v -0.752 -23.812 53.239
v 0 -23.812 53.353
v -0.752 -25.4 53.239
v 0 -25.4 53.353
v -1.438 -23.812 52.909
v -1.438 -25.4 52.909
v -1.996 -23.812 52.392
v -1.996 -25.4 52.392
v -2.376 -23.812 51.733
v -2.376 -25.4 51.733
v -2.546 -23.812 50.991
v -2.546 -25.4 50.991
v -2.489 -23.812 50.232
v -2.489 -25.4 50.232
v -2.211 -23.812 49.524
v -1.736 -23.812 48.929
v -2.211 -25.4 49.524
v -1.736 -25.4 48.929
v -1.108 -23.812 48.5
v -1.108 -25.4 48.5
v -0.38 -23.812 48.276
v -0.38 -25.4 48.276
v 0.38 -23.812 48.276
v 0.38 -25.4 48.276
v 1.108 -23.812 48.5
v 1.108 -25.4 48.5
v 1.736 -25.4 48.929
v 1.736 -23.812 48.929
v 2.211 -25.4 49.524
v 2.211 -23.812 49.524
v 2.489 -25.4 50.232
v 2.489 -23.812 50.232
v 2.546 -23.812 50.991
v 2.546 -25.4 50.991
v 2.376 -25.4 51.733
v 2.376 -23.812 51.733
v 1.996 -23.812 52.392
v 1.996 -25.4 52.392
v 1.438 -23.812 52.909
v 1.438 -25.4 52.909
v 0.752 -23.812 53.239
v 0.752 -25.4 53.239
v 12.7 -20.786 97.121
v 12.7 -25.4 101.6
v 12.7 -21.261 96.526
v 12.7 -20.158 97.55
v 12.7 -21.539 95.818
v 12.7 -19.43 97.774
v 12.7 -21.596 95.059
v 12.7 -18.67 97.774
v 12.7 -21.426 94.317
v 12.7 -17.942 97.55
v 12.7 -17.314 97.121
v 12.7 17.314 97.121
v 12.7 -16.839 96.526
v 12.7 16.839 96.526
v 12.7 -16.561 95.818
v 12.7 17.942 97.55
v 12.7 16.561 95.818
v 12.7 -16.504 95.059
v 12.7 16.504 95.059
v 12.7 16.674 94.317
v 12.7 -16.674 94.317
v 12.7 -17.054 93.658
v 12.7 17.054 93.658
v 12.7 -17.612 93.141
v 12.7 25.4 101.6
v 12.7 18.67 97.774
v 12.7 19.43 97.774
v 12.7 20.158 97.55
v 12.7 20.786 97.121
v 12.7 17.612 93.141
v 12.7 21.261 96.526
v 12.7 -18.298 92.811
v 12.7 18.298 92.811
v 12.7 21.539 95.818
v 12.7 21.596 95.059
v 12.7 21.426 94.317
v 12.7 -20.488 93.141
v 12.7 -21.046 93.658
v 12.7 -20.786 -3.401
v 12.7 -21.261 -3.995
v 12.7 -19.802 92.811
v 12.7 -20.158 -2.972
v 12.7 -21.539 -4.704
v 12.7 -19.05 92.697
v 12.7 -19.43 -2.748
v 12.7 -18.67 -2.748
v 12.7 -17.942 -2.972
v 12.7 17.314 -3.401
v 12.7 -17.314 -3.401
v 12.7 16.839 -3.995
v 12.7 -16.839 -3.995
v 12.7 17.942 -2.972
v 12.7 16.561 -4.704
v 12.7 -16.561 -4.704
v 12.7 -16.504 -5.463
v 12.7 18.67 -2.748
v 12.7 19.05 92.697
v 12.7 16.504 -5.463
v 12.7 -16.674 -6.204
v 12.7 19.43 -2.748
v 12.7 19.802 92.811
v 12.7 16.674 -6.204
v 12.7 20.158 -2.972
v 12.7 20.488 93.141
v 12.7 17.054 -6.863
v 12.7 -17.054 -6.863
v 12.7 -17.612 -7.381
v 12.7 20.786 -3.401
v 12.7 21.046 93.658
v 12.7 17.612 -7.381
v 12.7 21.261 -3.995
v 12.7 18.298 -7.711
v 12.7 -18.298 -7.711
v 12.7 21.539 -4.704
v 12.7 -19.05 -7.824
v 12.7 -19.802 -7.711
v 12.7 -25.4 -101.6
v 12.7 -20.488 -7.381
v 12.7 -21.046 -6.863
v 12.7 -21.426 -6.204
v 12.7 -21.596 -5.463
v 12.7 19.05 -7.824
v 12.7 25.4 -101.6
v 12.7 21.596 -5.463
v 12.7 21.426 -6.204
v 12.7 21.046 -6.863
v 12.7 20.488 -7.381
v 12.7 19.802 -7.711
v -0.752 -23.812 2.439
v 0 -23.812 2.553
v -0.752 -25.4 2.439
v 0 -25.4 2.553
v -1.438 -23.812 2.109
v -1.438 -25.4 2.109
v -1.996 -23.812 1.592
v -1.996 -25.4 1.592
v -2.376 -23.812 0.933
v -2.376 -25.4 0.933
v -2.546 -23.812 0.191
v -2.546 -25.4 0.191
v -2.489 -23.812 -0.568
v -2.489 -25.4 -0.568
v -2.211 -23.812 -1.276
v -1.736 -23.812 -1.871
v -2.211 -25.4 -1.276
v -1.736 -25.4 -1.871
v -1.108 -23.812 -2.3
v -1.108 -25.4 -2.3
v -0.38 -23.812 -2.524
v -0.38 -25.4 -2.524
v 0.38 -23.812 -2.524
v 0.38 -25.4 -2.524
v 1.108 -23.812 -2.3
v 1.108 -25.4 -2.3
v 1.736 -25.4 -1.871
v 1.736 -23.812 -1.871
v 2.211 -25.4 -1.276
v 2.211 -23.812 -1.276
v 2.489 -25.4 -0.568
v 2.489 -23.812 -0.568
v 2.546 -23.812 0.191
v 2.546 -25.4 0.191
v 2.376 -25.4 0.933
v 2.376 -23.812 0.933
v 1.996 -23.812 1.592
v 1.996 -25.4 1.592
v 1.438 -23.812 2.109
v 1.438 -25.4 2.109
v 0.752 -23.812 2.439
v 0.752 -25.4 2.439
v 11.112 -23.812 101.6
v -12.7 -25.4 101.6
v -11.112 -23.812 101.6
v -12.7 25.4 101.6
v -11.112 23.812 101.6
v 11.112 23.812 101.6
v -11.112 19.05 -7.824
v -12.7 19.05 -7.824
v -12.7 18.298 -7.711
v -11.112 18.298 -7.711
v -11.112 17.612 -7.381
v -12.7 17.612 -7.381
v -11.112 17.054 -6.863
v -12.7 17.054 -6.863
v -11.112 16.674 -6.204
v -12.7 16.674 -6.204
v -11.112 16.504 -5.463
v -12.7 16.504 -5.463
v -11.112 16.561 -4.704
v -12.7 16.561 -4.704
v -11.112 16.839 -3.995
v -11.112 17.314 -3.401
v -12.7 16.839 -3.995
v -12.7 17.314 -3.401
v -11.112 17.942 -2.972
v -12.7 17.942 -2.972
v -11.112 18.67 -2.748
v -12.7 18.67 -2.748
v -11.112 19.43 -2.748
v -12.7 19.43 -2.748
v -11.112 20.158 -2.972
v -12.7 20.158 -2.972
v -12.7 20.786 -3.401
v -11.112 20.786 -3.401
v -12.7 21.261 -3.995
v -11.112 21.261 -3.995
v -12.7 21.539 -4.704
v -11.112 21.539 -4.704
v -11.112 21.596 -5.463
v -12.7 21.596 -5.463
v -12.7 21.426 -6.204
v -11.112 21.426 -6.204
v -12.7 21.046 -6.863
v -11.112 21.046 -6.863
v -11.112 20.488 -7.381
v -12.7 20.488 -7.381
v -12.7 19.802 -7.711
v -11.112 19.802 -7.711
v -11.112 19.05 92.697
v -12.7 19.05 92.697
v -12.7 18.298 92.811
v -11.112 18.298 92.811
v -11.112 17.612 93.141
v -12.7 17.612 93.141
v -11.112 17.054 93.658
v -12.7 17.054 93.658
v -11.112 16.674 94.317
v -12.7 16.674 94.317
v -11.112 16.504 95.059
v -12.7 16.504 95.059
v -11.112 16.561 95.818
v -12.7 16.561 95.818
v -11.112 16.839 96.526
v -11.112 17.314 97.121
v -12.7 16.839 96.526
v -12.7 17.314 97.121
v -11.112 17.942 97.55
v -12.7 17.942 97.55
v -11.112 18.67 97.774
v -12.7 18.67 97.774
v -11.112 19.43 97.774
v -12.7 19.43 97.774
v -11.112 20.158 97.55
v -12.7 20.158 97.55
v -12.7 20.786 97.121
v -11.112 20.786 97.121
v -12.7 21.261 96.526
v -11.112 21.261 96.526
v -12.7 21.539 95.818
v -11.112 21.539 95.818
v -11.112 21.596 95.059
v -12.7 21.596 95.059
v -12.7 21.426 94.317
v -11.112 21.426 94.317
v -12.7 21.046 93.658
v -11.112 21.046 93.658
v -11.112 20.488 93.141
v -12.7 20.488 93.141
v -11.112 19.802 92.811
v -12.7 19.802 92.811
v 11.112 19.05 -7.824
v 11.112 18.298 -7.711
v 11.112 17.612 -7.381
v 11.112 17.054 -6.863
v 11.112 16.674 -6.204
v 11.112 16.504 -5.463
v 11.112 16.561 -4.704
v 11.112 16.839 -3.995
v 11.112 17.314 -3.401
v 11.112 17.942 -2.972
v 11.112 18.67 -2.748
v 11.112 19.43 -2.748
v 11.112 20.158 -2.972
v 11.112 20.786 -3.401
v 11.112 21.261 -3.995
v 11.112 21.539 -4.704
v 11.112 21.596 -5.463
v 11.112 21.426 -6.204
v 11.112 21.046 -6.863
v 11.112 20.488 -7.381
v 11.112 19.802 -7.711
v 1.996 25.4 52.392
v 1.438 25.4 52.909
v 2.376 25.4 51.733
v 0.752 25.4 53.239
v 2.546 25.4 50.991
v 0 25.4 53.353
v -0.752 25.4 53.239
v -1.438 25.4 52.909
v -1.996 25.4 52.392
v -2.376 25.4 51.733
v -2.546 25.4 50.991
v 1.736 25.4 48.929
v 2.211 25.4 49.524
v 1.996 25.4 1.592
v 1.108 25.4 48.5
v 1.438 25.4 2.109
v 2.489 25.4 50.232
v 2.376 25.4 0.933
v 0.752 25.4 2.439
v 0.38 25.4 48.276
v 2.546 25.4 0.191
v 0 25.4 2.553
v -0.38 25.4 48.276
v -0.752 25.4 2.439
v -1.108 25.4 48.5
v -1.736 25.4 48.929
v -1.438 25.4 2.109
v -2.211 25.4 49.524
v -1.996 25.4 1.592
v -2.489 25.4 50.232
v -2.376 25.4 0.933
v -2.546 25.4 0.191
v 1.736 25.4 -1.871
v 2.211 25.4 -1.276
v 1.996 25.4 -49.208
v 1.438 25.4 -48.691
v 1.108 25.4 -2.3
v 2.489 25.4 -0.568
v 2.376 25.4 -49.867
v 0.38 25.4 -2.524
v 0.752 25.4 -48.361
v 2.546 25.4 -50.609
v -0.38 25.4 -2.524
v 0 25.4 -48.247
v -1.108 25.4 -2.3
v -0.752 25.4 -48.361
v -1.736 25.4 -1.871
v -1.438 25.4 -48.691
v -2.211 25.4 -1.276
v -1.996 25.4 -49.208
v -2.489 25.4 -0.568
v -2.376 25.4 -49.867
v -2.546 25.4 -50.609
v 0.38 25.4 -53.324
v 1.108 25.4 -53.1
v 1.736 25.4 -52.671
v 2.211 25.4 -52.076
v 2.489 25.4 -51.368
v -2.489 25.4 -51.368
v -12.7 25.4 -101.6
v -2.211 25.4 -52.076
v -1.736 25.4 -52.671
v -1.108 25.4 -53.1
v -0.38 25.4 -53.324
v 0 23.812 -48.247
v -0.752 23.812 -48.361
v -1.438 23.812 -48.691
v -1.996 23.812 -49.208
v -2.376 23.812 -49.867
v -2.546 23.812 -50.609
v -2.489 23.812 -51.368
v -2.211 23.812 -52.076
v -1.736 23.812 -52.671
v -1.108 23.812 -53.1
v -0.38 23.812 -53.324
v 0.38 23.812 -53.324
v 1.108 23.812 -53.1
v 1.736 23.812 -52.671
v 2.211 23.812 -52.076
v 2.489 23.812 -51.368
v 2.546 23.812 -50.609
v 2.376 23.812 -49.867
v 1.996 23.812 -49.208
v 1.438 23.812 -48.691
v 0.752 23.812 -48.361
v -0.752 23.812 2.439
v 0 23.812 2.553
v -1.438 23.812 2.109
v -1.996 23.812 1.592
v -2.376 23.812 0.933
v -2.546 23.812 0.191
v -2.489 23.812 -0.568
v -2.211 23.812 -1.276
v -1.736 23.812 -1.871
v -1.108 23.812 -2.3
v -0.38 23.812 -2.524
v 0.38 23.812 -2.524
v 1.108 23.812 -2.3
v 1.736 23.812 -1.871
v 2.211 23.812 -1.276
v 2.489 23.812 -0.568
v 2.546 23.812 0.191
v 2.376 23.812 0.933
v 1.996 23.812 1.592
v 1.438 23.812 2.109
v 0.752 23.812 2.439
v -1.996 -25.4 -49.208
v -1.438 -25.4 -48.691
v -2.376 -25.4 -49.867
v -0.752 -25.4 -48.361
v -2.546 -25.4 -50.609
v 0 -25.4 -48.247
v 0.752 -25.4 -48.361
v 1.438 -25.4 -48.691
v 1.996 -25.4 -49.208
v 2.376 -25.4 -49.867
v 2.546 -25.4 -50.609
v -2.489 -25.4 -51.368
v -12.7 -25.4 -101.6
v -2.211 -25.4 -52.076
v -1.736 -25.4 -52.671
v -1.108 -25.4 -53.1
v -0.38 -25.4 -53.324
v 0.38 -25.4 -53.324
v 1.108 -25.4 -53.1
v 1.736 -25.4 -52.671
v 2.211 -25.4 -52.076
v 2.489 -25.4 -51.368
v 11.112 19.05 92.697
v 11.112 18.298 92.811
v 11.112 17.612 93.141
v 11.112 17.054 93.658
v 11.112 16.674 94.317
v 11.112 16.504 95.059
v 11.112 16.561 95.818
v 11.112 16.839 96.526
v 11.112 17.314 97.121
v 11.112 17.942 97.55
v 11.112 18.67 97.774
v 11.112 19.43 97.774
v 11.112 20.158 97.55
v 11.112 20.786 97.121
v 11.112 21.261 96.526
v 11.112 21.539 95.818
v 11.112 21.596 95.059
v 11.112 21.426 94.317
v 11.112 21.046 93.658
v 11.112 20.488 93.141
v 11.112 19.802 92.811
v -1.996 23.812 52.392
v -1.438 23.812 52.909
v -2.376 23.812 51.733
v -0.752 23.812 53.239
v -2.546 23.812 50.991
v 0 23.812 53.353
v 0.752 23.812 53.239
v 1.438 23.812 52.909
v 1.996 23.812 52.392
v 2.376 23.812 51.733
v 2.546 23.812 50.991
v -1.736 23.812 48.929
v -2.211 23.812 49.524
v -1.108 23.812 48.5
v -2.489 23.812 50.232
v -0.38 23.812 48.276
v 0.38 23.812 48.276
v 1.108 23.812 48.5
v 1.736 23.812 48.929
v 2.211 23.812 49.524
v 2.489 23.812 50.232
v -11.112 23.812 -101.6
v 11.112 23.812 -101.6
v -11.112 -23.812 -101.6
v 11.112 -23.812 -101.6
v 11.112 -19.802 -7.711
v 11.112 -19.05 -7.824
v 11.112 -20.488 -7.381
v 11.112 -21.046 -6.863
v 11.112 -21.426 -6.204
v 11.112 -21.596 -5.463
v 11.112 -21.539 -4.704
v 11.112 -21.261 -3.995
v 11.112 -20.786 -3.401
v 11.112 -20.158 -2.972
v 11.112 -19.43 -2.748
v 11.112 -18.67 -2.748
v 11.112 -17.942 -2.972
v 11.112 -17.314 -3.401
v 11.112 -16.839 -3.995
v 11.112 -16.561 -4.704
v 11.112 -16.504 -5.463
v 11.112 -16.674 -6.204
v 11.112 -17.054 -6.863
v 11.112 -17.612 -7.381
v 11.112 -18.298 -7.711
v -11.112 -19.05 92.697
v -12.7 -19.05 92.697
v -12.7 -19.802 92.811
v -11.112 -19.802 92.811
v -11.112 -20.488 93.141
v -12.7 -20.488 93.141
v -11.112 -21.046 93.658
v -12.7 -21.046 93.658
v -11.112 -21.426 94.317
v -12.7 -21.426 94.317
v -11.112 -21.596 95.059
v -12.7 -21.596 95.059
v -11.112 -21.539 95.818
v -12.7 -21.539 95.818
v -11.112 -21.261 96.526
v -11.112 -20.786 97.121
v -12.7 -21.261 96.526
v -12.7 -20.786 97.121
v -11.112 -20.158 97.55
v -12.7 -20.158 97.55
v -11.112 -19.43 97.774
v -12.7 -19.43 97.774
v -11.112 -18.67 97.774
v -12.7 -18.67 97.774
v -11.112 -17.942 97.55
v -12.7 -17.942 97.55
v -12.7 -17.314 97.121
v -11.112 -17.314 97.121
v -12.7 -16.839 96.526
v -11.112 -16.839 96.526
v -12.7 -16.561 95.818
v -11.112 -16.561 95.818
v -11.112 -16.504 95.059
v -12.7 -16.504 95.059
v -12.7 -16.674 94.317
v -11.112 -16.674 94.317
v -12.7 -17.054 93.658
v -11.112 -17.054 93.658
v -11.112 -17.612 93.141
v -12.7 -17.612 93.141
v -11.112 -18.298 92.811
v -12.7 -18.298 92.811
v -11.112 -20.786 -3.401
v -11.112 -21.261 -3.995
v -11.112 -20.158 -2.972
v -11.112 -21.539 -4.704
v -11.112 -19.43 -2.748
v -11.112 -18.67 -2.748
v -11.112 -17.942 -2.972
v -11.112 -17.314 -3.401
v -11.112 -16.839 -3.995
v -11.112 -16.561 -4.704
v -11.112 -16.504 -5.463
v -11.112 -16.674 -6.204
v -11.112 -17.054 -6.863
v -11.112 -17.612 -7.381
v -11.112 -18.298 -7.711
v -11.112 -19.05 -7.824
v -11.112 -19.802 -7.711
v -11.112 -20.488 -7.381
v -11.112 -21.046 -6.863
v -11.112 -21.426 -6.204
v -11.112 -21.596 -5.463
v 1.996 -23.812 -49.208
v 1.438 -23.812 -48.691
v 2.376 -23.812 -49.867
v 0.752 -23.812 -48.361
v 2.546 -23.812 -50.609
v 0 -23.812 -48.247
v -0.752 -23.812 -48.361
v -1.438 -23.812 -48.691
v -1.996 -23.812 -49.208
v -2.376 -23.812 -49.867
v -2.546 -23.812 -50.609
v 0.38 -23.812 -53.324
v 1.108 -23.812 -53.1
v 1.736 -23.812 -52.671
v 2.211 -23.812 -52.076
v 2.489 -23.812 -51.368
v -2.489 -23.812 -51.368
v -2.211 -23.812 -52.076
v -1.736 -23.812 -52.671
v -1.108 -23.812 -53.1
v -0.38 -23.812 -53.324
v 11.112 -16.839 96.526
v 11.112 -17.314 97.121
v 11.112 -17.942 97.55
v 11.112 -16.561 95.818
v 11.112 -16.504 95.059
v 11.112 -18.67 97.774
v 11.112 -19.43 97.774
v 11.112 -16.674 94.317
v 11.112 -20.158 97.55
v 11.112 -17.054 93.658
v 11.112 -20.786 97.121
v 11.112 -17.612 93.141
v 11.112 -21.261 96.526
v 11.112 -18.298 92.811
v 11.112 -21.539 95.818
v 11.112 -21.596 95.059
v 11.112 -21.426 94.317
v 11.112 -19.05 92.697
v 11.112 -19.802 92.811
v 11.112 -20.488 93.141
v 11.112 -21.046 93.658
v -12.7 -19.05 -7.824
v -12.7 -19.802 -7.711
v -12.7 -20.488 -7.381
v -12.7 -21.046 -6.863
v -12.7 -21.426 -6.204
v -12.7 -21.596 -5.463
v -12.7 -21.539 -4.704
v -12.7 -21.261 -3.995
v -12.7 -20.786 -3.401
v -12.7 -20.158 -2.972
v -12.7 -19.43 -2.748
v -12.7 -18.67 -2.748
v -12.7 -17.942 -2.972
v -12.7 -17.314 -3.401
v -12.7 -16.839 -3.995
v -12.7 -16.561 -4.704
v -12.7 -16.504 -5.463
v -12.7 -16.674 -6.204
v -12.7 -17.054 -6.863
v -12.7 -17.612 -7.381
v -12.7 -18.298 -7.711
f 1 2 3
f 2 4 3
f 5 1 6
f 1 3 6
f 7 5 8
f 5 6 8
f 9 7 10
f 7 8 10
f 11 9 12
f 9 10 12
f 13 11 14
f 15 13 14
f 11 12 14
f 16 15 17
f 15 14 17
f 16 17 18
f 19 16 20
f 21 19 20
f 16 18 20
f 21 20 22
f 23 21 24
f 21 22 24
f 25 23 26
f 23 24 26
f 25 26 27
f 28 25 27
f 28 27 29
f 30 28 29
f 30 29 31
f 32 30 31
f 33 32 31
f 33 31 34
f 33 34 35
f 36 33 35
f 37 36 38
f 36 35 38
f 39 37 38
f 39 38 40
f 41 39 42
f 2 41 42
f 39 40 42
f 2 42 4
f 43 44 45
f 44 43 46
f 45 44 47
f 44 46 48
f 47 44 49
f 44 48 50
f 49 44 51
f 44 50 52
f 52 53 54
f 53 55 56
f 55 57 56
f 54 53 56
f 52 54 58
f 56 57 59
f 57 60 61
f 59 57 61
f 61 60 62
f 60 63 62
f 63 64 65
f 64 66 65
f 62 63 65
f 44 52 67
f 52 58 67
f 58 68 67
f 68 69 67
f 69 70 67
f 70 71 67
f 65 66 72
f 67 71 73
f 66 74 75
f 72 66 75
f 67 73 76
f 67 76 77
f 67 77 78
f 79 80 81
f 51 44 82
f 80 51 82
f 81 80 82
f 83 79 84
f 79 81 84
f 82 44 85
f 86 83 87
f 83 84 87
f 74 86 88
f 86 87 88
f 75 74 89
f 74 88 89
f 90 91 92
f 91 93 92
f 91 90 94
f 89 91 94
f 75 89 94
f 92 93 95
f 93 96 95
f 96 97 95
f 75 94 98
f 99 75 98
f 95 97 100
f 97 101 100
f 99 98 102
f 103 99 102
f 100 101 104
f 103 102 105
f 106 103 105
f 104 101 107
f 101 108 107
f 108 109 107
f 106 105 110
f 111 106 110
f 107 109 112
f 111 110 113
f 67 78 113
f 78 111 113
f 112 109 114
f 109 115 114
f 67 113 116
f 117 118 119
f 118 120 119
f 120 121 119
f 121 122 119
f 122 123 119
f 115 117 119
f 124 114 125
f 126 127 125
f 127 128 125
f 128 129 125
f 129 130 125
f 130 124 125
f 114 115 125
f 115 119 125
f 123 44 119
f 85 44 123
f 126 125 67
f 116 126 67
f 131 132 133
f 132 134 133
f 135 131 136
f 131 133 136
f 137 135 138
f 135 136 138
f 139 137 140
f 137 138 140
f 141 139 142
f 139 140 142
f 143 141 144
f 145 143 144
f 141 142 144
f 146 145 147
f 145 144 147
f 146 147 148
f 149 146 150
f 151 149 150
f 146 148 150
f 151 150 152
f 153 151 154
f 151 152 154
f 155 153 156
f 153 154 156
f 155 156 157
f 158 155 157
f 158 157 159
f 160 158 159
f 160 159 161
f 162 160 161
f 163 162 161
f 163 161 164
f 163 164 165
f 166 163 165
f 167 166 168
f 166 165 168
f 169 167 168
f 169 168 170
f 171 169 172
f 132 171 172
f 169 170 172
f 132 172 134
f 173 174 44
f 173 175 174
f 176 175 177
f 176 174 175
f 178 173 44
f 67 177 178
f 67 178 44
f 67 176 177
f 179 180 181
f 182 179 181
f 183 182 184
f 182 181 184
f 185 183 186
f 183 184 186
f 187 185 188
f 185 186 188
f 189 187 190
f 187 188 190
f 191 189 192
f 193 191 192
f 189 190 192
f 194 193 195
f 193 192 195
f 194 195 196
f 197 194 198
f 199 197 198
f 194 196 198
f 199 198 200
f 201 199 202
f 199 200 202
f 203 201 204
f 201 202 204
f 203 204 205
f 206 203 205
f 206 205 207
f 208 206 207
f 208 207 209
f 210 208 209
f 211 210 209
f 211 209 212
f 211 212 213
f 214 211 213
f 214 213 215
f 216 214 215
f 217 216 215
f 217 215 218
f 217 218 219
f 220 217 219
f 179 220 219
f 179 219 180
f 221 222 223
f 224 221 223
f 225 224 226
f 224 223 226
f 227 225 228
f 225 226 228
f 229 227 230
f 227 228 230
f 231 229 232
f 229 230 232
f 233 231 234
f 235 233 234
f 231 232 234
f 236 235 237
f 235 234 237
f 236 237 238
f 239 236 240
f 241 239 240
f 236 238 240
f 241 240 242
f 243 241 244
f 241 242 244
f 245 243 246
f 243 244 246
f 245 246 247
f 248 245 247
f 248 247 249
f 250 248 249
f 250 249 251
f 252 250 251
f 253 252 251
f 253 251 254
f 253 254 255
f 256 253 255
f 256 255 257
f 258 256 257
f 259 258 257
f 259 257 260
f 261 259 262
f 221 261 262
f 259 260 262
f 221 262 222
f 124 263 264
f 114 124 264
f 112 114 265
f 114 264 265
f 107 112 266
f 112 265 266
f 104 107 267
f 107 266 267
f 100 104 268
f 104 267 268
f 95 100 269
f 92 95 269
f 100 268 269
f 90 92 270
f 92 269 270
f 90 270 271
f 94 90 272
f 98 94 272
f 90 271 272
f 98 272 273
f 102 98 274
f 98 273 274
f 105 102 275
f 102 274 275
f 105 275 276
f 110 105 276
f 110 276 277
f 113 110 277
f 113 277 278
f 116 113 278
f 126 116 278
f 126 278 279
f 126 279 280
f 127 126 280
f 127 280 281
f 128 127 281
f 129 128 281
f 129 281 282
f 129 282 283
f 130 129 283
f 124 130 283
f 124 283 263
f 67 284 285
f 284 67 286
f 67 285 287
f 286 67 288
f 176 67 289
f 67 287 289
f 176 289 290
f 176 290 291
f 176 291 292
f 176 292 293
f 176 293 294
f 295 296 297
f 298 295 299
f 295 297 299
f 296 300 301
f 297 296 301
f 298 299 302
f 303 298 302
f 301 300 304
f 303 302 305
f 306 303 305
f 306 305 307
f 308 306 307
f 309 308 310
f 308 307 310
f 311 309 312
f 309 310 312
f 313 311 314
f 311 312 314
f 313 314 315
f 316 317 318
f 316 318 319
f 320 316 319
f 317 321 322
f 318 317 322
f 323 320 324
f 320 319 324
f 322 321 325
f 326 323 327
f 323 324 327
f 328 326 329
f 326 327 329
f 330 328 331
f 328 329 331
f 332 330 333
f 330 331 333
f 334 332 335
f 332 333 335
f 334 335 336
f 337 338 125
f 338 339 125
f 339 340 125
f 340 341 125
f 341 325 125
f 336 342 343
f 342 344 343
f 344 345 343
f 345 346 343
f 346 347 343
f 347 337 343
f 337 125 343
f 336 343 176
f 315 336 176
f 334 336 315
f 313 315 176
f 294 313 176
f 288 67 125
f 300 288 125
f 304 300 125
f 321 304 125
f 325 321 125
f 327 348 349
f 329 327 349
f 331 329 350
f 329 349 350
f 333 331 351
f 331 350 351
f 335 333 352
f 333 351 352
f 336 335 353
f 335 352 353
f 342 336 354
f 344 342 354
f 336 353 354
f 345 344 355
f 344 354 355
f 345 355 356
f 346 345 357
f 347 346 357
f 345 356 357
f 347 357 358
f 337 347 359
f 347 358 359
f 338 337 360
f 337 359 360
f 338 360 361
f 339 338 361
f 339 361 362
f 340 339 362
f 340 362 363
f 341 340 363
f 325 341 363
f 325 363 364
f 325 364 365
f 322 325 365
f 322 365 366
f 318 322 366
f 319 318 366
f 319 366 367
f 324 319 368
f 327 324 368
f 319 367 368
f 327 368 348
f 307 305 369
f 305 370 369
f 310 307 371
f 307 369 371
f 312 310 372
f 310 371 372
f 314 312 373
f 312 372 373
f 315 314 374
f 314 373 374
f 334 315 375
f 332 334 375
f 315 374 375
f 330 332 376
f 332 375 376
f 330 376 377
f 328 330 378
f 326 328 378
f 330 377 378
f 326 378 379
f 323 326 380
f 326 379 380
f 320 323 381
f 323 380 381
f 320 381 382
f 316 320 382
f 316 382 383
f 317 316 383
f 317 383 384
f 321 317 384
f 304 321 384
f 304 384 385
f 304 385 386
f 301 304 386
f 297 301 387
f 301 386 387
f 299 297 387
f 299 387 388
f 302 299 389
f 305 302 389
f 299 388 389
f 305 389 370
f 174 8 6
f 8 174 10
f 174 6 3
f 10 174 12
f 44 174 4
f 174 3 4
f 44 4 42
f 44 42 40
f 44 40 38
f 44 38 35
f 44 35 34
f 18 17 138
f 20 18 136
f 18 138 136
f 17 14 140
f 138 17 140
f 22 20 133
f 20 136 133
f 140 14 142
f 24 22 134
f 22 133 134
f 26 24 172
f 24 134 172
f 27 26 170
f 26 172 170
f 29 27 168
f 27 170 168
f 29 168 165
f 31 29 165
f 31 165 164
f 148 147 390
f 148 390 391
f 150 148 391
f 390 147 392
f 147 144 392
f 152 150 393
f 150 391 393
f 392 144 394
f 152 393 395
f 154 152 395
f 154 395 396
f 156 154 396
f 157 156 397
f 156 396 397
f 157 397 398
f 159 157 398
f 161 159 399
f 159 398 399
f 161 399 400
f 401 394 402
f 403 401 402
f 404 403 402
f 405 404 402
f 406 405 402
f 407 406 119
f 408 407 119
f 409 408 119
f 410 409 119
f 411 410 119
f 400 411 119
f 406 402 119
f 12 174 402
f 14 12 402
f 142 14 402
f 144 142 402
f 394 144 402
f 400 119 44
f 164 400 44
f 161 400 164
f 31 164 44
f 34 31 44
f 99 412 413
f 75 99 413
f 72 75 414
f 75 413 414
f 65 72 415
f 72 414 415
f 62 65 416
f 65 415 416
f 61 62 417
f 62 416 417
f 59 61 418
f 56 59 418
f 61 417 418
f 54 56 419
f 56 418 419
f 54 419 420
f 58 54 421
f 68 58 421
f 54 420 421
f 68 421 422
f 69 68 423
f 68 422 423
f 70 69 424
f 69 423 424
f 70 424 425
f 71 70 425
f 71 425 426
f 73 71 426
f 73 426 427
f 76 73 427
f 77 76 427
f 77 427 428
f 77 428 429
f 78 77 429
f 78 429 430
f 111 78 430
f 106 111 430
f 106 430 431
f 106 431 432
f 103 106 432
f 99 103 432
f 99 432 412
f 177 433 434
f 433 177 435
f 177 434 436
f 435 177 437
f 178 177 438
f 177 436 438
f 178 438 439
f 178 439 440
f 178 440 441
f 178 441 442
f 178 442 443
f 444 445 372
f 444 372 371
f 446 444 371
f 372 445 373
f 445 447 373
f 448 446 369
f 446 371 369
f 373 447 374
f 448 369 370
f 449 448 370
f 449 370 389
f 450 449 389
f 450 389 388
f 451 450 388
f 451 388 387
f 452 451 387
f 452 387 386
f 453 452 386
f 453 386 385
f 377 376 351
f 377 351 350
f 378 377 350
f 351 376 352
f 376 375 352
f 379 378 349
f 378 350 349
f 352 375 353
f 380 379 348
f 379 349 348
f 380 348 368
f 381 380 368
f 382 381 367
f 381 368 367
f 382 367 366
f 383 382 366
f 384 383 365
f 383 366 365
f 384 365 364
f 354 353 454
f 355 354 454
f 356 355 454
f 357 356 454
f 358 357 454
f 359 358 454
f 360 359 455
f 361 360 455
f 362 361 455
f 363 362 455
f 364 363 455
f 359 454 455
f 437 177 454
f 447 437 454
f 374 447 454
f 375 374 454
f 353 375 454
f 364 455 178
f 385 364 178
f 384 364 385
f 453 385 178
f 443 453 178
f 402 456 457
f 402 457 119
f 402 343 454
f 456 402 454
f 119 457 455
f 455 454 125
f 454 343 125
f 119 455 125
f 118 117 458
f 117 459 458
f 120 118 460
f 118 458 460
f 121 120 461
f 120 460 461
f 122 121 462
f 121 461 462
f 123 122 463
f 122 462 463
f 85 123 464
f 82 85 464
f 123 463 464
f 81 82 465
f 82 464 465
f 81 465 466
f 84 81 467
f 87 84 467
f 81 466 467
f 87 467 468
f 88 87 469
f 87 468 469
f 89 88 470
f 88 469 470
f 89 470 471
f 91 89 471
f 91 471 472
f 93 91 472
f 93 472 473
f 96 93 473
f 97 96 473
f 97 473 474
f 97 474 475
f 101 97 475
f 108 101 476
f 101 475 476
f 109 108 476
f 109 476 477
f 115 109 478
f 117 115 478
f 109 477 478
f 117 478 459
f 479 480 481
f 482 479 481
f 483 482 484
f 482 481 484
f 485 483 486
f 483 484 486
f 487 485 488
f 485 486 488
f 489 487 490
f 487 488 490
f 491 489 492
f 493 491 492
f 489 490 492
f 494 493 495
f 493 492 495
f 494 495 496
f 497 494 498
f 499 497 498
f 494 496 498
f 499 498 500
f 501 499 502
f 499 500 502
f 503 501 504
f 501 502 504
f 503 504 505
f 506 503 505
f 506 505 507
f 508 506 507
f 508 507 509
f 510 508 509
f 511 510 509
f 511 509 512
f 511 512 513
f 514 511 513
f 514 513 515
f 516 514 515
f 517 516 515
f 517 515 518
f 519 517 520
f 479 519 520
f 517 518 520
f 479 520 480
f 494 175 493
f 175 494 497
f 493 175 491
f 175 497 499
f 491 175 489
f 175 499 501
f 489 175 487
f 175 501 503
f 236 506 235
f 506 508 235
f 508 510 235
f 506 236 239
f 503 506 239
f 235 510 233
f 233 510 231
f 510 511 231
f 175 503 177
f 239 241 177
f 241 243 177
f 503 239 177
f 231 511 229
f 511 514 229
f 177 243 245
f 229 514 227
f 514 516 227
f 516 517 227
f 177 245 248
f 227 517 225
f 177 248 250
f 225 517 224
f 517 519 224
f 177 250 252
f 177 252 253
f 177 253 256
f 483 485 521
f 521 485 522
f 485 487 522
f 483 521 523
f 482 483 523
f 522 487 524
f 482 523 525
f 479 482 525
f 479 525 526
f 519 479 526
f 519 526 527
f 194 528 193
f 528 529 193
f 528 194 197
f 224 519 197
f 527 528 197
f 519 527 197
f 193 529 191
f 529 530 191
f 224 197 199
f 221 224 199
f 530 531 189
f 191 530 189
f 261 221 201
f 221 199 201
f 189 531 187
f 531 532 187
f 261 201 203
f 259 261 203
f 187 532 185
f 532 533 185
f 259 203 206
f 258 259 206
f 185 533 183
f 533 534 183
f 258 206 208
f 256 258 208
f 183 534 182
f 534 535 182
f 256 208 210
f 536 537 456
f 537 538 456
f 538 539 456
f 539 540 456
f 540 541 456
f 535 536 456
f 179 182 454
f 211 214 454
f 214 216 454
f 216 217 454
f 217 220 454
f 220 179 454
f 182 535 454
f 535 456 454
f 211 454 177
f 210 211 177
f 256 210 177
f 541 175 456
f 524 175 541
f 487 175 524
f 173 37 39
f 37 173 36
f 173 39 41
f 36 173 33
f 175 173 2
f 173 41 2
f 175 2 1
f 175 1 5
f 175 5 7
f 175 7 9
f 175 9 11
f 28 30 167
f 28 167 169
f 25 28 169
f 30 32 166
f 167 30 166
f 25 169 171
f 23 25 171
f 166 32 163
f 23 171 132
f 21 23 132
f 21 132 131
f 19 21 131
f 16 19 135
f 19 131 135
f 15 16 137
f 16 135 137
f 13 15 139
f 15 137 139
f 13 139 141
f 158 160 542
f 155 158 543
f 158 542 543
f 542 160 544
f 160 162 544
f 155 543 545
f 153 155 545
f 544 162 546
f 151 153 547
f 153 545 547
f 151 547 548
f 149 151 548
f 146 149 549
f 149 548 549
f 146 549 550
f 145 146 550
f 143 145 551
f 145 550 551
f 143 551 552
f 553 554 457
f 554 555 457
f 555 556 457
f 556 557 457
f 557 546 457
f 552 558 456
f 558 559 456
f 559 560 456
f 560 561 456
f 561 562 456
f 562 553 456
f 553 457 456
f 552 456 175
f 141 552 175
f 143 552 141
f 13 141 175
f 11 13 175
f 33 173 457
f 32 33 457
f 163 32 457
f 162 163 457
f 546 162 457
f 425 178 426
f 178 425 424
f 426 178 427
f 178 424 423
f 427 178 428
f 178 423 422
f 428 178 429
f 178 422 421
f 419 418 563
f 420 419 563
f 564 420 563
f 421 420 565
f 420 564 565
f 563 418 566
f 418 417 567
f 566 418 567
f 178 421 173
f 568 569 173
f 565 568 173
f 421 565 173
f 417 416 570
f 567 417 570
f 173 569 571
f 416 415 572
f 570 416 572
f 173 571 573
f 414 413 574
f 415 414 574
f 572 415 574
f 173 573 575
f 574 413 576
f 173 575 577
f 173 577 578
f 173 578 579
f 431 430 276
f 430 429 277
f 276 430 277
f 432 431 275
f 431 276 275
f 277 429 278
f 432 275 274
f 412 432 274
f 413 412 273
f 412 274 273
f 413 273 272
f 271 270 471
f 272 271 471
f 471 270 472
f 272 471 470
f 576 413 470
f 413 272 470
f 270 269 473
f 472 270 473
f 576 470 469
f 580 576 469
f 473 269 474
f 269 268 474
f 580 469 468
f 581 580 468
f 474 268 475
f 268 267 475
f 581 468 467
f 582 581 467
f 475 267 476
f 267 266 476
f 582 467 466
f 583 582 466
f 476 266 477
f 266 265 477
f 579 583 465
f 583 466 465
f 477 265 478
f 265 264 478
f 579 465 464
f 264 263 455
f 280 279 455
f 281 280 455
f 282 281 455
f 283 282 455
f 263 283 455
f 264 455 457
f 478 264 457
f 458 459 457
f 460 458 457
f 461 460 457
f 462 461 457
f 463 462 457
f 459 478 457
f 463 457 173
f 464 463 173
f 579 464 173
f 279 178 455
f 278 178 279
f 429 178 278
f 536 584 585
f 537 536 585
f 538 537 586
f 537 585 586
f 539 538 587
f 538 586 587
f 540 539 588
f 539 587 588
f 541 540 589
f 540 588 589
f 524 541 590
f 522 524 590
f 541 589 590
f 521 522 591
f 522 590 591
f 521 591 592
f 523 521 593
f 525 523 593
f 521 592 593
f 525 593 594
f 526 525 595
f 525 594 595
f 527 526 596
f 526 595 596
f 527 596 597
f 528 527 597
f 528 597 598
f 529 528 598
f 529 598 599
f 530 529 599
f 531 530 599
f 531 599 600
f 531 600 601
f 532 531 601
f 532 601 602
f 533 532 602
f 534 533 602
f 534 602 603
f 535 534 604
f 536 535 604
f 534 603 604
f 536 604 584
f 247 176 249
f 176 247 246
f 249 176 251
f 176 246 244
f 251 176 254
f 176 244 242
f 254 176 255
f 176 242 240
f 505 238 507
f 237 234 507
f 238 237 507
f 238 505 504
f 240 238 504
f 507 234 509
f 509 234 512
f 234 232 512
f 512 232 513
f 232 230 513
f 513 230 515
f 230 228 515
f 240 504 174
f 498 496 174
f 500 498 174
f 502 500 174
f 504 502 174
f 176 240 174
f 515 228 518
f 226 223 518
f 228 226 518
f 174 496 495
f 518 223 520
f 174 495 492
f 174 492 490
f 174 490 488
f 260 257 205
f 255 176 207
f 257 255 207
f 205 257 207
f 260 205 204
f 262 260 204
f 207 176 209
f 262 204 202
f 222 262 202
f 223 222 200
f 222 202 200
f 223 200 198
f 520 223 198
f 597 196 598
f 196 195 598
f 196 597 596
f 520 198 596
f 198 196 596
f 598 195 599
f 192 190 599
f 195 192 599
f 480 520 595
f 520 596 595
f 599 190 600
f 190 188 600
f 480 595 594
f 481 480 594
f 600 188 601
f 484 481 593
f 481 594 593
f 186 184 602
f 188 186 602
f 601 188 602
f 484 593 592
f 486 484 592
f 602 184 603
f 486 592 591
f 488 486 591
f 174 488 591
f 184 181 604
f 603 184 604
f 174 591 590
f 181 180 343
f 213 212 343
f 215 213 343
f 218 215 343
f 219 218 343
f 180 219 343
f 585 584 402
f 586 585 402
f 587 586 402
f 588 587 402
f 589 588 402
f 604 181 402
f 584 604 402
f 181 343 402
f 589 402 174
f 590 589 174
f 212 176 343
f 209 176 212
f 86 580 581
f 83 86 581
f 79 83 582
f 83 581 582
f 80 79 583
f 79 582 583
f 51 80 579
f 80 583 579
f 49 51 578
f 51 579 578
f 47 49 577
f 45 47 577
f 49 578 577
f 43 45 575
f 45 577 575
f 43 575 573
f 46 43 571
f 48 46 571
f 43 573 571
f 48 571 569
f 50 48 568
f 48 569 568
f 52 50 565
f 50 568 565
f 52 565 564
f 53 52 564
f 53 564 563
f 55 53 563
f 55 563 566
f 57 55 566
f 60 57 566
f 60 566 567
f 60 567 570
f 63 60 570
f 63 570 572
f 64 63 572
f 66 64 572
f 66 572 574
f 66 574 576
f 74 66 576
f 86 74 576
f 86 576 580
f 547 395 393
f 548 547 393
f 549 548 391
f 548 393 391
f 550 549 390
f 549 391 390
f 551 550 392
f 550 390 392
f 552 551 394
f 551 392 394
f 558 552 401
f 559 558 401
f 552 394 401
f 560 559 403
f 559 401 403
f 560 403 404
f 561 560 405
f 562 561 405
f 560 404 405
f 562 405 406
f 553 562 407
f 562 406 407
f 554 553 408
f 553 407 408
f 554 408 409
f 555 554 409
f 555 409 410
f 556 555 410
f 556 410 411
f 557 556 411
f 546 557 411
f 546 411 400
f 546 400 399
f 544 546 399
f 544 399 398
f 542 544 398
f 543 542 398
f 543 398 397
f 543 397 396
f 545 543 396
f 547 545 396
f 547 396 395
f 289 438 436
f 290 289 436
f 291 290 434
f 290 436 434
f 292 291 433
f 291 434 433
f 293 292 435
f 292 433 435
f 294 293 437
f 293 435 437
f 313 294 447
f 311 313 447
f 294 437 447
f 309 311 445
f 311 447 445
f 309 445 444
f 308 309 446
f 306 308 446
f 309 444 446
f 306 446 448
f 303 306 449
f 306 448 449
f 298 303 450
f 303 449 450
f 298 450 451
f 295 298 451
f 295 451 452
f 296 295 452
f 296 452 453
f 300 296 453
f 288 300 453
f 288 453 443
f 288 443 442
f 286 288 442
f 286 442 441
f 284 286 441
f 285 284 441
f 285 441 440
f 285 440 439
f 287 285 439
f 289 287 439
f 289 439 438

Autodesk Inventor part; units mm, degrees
ref_plane "YZ Plane" through (0, 0, 0) normal (1, 0, 0) x (0, 1, 0)
ref_plane "XZ Plane" through (0, 0, 0) normal (0, 1, 0) x (-1, 0, 0)
ref_plane "XY Plane" through (0, 0, 0) normal (0, 0, 1) x (1, 0, 0)
sketch "Sketch1" plane through (0, 0, 0) normal (0, 0, 1) x (1, 0, 0)
  line L0 (-12.7, -25.4) -> (12.7, -25.4)
  line L1 (12.7, -25.4) -> (12.7, 25.4)
  line L2 (12.7, 25.4) -> (-12.7, 25.4)
  line L3 (-12.7, 25.4) -> (-12.7, -25.4)
  line L4 (-12.7, -25.4) -> (12.7, 25.4) construction
  line L5 (12.7, -25.4) -> (-12.7, 25.4) construction
  line L6 (-11.1125, 23.8125) -> (11.1125, 23.8125)
  line L7 (11.1125, 23.8125) -> (11.1125, -23.8125)
  line L8 (11.1125, -23.8125) -> (-11.1125, -23.8125)
  line L9 (-11.1125, -23.8125) -> (-11.1125, 23.8125)
  point P0 (0, 0)
  dimension "width" = 25.4
  dimension "height" = 50.8
  dimension "thickness" = 1.5875
extrude "Extrusion1" add sketch "Sketch1" along normal mid plane 203.2
sketch "Sketch2" plane through (-12.7, 25.4, 101.6) normal (0, 1, 0) x (1, 0, 0)
  line L0 (0, 203.2) -> (0, 0) construction
  line L1 (25.4, 0) -> (0, 0) construction
  line L2 (25.4, 203.2) -> (25.4, 0) construction
  line L3 (0, 203.2) -> (25.4, 203.2) construction
  line L4 (12.7, 152.4) -> (12.7, 50.8) construction
  point P0 (12.7, 101.6)
  point P1 (12.7, 101.6)
  point P2 (12.7, 101.6)
  dimension "d5" = 101.6
hole "Hole1" at (0, 25.4, -50.8) at (0, 25.4, 50.8) at (0, 25.4, 0) direction (0, -1, 0) diameter 5.1054 end through all clearance for "Flat Head Machine Screw (82)" size "#10" standard "Ansi Unified Screw Threads"
sketch "Sketch4" plane through (12.7, -25.4, 101.6) normal (1, 0, 0) x (0, 0, -1)
  circle A0 centre (56.6109, 25.4) radius 53.75 construction
  line L0 (6.35, 6.35) -> (106.8718, 6.35) construction
  line L1 (106.8718, 6.35) -> (106.8718, 44.45) construction
  line L2 (106.8718, 44.45) -> (6.35, 44.45) construction
  line L3 (6.35, 44.45) -> (6.35, 6.35) construction
  line L4 (6.35, 6.35) -> (106.8718, 44.45) construction
  line L5 (106.8718, 6.35) -> (6.35, 44.45) construction
  line L6 (0, 0) -> (0, 50.8) construction
  point P0 (101.6, 25.4)
  dimension "d25" = 107.5
  dimension "d27" = 6.35
  dimension "d28" = 38.1
hole "Hole3" at (12.7, 19.05, 95.25) at (12.7, 19.05, -5.2718) at (12.7, -19.05, -5.2718) at (12.7, -19.05, 95.25) direction (-1, 0, 0) diameter 5.1054 end through all clearance for "Flat Head Machine Screw (82)" size "#10" standard "Ansi Unified Screw Threads"
sketch "Sketch3" plane through (12.7, -25.4, 101.6) normal (1, 0, 0) x (0, 0, -1)
  line L0 (51.3391, 44.45) -> (151.8609, 44.45) construction
  line L1 (151.8609, 44.45) -> (151.8609, 6.35) construction
  line L2 (151.8609, 6.35) -> (51.3391, 6.35) construction
  line L3 (51.3391, 6.35) -> (51.3391, 44.45) construction
  line L4 (51.3391, 44.45) -> (151.8609, 6.35) construction
  line L5 (151.8609, 44.45) -> (51.3391, 6.35) construction
  circle A0 centre (101.6, 25.4) radius 60 construction
  circle A1 centre (101.6, 25.4) radius 47.5 construction
  circle A2 centre (101.6, 25.4) radius 53.75 construction
  dimension "d16" = 107.5
  dimension "d14" = 120
  dimension "d15" = 95
  dimension "d17" = 38.1
properties part number "GP6-003" material "Aluminum 6061"
